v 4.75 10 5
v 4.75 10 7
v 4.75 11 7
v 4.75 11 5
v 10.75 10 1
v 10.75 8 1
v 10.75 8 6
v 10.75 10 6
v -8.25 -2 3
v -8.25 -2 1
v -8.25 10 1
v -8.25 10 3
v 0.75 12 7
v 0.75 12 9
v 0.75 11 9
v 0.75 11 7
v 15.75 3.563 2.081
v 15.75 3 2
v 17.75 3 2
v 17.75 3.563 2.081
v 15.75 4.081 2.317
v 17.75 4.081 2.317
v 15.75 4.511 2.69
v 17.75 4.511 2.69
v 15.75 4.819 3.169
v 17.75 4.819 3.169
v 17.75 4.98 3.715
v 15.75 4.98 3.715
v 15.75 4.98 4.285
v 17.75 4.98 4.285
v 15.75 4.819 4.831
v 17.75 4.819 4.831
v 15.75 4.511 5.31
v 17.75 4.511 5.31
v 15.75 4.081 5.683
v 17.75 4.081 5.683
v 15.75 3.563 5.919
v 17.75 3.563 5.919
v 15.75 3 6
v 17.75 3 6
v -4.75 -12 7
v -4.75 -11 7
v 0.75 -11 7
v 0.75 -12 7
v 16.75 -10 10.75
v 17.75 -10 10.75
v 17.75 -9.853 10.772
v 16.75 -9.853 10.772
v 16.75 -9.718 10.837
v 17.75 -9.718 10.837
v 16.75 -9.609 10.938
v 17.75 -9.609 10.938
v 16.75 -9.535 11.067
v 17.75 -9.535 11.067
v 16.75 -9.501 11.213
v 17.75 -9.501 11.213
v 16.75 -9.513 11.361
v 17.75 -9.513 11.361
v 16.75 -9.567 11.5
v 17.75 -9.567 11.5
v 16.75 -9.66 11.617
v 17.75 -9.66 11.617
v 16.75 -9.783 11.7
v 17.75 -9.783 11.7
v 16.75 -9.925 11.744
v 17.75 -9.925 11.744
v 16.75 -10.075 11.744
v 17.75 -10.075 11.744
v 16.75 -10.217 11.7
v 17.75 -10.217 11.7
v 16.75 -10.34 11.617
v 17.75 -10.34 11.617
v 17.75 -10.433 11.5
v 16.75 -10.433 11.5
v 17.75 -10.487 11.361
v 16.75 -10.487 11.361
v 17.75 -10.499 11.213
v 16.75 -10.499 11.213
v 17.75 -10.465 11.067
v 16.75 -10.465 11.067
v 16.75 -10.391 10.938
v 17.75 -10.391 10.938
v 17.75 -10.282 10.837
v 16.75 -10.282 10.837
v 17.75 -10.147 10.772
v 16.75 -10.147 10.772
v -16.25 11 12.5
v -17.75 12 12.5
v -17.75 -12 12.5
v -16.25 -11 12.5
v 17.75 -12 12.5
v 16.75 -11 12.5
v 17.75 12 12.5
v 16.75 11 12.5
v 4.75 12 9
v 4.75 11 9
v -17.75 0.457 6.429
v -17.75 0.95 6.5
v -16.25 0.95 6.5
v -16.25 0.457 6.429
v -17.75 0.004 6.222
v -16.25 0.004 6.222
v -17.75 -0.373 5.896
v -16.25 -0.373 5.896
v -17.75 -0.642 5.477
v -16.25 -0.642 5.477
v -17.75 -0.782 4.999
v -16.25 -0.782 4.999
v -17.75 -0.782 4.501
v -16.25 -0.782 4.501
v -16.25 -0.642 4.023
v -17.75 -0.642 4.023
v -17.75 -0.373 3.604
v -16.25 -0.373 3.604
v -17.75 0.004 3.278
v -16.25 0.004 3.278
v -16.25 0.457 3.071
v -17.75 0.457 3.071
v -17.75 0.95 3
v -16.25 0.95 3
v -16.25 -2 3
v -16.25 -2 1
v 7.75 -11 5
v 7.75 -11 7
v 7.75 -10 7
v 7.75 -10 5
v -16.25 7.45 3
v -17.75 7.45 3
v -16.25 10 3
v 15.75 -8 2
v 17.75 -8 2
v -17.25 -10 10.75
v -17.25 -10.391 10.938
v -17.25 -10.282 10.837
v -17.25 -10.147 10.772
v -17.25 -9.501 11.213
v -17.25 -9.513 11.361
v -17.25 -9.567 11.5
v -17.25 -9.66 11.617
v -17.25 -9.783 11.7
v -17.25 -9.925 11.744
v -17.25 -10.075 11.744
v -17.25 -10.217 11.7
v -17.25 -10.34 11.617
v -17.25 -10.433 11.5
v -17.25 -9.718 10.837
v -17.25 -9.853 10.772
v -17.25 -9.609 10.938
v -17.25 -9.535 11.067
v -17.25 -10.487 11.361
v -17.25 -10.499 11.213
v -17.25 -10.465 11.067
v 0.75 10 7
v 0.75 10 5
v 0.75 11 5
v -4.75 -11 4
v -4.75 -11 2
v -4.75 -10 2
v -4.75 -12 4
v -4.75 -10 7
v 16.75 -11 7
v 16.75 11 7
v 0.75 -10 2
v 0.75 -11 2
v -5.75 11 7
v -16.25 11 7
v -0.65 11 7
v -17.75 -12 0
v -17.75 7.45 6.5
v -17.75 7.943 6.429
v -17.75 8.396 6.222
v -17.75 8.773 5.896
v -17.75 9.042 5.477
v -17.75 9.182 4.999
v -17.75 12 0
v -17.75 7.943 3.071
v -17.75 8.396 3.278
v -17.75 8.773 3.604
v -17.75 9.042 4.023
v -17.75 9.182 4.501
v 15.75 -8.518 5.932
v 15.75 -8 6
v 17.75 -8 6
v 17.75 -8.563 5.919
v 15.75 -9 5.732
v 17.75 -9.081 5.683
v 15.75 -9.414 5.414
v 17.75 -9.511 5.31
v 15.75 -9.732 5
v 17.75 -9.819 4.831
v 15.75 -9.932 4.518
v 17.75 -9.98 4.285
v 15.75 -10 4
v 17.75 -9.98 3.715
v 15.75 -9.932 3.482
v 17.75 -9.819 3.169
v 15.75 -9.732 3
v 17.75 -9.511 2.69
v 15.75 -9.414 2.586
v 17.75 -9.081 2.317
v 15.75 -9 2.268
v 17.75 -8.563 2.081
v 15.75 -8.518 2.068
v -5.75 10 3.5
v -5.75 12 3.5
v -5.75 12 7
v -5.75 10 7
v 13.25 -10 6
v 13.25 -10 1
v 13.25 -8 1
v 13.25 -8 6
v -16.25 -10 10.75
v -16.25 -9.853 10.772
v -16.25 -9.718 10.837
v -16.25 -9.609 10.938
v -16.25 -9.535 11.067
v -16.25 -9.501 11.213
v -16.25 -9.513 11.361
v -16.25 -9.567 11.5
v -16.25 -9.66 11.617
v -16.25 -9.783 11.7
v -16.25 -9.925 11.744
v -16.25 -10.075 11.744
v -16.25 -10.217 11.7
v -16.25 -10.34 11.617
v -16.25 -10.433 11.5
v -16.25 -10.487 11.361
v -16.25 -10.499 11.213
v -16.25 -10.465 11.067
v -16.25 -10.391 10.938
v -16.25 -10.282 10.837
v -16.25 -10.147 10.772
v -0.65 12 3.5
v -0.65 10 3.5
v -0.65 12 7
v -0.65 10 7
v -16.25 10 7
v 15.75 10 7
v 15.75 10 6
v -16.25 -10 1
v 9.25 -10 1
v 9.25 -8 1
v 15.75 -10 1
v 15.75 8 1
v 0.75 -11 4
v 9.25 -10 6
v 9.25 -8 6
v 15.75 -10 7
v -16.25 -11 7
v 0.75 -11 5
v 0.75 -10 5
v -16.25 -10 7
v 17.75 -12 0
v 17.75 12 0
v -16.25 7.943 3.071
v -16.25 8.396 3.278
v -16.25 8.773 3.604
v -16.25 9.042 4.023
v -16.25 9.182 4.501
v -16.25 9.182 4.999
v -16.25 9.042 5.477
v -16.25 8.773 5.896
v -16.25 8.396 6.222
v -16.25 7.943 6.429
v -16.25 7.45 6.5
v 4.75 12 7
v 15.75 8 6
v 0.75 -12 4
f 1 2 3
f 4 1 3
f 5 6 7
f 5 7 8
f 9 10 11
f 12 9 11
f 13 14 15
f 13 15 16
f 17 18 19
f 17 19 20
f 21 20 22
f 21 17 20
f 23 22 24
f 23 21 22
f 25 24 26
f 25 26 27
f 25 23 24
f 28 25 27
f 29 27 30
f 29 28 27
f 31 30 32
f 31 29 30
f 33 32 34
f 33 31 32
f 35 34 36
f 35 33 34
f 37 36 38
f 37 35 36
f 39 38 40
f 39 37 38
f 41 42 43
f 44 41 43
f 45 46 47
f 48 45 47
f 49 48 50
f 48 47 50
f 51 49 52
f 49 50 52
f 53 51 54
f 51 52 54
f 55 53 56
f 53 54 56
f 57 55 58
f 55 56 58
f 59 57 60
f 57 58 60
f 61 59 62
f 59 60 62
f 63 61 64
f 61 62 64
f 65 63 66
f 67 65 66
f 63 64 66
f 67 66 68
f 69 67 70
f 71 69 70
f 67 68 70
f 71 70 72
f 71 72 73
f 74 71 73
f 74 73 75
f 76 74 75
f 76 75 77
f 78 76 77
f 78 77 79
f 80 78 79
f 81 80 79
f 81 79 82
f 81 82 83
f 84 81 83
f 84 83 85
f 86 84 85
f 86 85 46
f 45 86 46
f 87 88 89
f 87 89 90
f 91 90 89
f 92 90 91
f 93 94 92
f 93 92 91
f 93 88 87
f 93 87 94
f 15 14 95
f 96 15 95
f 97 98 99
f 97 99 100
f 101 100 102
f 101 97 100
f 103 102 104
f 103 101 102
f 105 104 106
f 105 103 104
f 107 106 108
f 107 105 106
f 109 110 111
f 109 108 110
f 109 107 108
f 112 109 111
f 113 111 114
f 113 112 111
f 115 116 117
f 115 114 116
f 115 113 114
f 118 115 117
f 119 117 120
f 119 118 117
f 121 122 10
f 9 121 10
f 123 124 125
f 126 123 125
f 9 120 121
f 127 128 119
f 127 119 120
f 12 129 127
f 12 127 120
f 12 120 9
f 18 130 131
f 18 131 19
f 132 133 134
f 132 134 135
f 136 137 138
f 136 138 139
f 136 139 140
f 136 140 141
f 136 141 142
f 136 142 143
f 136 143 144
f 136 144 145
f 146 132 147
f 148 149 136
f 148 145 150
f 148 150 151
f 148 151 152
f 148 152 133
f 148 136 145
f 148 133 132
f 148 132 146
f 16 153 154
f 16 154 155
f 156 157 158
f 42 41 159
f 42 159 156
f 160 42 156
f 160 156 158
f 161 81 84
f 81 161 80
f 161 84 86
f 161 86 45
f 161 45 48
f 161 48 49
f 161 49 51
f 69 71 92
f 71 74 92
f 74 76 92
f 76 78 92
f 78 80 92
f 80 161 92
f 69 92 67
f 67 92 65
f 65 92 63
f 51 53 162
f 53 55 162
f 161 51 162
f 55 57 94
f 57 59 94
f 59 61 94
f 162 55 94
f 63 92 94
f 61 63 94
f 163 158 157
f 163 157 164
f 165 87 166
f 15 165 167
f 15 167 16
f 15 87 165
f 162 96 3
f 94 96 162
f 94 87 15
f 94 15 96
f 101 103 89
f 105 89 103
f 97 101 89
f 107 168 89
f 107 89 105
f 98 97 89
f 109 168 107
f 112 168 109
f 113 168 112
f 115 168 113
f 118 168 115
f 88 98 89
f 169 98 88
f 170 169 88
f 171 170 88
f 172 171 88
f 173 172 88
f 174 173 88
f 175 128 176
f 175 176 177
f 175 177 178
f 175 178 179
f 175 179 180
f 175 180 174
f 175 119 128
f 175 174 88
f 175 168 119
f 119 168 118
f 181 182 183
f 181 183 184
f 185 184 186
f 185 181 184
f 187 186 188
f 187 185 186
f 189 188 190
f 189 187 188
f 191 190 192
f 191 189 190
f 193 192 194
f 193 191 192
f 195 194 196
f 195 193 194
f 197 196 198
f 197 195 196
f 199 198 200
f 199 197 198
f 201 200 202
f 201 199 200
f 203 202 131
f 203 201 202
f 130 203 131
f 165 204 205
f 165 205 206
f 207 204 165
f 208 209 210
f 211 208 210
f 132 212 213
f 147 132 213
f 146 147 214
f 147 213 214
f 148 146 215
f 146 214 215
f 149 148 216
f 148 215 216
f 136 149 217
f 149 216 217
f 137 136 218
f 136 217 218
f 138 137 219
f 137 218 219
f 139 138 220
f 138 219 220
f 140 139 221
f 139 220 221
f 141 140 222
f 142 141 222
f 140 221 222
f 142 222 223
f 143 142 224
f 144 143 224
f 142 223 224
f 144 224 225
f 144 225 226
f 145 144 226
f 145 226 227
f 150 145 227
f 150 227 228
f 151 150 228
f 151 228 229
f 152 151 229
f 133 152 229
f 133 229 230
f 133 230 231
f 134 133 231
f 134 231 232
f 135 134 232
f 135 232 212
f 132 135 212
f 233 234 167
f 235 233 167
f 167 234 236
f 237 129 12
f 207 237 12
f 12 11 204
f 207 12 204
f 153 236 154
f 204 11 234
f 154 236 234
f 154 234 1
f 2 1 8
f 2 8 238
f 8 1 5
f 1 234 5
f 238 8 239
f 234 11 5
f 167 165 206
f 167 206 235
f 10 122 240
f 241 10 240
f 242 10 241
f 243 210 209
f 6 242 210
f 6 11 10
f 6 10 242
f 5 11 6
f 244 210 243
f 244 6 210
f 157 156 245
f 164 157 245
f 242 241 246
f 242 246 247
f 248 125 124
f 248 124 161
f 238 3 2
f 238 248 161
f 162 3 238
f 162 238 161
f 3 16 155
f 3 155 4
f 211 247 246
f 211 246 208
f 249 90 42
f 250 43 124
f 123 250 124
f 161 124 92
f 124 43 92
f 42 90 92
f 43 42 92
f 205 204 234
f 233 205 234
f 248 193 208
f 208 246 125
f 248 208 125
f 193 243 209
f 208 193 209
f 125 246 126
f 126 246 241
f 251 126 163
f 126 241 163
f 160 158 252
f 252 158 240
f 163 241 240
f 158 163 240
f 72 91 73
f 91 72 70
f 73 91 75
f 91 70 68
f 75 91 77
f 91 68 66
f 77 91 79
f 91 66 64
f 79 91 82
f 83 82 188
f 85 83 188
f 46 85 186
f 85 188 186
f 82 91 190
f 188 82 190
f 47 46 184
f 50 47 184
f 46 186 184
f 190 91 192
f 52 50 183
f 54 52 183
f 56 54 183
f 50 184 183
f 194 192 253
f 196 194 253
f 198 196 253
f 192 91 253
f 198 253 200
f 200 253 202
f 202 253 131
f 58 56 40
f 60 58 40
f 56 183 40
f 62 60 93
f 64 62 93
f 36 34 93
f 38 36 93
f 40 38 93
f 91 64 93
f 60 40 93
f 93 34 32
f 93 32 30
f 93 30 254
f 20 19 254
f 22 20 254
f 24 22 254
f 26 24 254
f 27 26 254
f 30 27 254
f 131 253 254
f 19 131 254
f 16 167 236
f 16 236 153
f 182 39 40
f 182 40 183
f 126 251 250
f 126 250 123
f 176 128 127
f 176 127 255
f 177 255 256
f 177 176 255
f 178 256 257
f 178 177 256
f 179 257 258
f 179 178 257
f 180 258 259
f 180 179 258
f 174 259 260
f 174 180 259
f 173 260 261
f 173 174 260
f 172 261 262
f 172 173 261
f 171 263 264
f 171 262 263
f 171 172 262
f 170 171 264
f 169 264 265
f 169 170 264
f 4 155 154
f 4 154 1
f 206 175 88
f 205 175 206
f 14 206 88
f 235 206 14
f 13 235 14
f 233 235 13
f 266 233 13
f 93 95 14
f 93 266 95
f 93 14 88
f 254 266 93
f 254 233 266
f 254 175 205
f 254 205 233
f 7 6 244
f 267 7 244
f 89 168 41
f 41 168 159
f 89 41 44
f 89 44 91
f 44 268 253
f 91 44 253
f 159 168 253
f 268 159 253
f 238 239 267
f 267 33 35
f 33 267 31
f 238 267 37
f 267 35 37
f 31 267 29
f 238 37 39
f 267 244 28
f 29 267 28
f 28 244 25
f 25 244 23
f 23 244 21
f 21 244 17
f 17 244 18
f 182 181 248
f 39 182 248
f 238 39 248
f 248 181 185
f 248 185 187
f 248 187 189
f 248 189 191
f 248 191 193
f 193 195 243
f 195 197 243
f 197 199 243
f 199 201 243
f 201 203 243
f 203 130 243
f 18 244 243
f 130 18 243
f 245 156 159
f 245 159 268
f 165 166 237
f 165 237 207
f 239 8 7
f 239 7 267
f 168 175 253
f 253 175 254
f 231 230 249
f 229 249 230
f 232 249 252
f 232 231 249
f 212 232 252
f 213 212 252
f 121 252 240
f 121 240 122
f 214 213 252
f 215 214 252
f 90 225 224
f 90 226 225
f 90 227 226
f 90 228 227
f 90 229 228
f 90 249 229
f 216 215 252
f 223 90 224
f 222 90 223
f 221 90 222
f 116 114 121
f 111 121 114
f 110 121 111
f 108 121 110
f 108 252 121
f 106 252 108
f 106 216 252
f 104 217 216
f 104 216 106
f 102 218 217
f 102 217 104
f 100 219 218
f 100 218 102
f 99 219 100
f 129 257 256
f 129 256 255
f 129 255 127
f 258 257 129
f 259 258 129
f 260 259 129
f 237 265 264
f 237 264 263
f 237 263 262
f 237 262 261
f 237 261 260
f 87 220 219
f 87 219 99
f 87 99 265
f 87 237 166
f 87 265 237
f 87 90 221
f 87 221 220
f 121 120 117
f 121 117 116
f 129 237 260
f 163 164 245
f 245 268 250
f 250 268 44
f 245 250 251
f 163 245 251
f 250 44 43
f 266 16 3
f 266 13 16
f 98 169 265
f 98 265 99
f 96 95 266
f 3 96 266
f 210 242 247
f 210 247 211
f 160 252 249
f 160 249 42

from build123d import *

# Parameters (mm, degrees)
SKETCH_1_W           = 35.5
SKETCH_1_H           = 24
EXTRUDE_1_DEPTH      = 12.5
SKETCH_2_W           = 33
SKETCH_2_H           = 22
CUT_EXTRUDE_1_DEPTH  = 11.5
CUT_EXTRUDE_2_DEPTH  = 2
EXTRUDE_2_DEPTH      = 6
SKETCH_7_W           = 4
SKETCH_7_H           = 2
SKETCH_7_W_2         = 5
EXTRUDE_3_DEPTH      = 5
CUT_EXTRUDE_4_DEPTH  = 2
SKETCH_11_R          = 0.5
CUT_EXTRUDE_5_DEPTH  = 35
SKETCH_12_W          = 5.5
SKETCH_12_H          = 1
CUT_EXTRUDE_6_DEPTH  = 5
SKETCH_15_W          = 5.5
SKETCH_15_H          = 3
CUT_EXTRUDE_7_DEPTH  = 5
SKETCH_16_W          = 5.1
SKETCH_16_H          = 3.5
CUT_EXTRUDE_8_DEPTH  = 5
SKETCH_18_W          = 7
SKETCH_18_H          = 1
FPC_DEPTH            = 2
SKETCH_19_W          = 8
SKETCH_19_H          = 12
USB_DEPTH            = 2
SKETCH_20_W          = 4
SKETCH_20_H          = 2
CUT_EXTRUDE_10_DEPTH = 2
SKETCH_21_W          = 4
SKETCH_21_H          = 1
CUT_EXTRUDE_11_DEPTH = 2


with BuildPart() as part:
    # 草图1 → 凸台-拉伸1 (new body)
    with BuildSketch(Plane.XY):
        Rectangle(SKETCH_1_W, SKETCH_1_H)
    extrude(amount=EXTRUDE_1_DEPTH)

    # 草图2 → 切除-拉伸1 (cut)
    with BuildSketch(Plane.XY.offset(12.5)):
        with Locations((0.25, 0)):
            Rectangle(SKETCH_2_W, SKETCH_2_H)
    extrude(amount=-CUT_EXTRUDE_1_DEPTH, mode=Mode.SUBTRACT)

    # 草图3 → 切除-拉伸2 (cut)
    with BuildSketch(Plane.ZY.offset(17.75)):
        with BuildLine():
            Line((6.5, 7.45), (6.5, 0.95))
            ThreePointArc((6.5, 0.95), (4.75, -0.8), (3, 0.95))
            Line((3, 0.95), (3, 7.45))
            ThreePointArc((3, 7.45), (4.75, 9.2), (6.5, 7.45))
        make_face()
    extrude(amount=-CUT_EXTRUDE_2_DEPTH, mode=Mode.SUBTRACT)

    # 草图6 → 凸台-拉伸2 (add)
    with BuildSketch(Plane.XY.offset(1)):
        Polygon((-16.25, 10), (15.75, 10), (15.75, -10), (-16.25, -10), (-16.25, -11), (16.75, -11), (16.75, 11), (-16.25, 11), align=None)
    extrude(amount=EXTRUDE_2_DEPTH)

    # 草图7 → 凸台-拉伸3 (add)
    with BuildSketch(Plane.XY.offset(1)):
        with Locations((11.25, -9)):
            Rectangle(SKETCH_7_W, SKETCH_7_H)
        with Locations((13.25, 9)):
            Rectangle(SKETCH_7_W_2, SKETCH_7_H)
    extrude(amount=EXTRUDE_3_DEPTH)

    # 草图10 → 切除-拉伸4 (cut)
    with BuildSketch(Plane.ZY.offset(-15.75)):
        with BuildLine():
            Line((2, -8), (2, 3))
            ThreePointArc((2, 3), (4, 5), (6, 3))
            Line((6, 3), (6, -8))
            ThreePointArc((6, -8), (4, -10), (2, -8))
        make_face()
    extrude(amount=-CUT_EXTRUDE_4_DEPTH, mode=Mode.SUBTRACT)

    # 草图11 → 切除-拉伸5 (cut)
    with BuildSketch(Plane(origin=(17.75, 0, 0), x_dir=(0, 0, -1), z_dir=(1, 0, 0))):
        with Locations((-11.25, -10)):
            Circle(SKETCH_11_R)
    extrude(amount=-CUT_EXTRUDE_5_DEPTH, mode=Mode.SUBTRACT)

    # 草图12 → 切除-拉伸6 (cut)
    with BuildSketch(Plane.XY.offset(7)):
        with Locations((-2, -10.5)):
            Rectangle(SKETCH_12_W, SKETCH_12_H)
    extrude(amount=-CUT_EXTRUDE_6_DEPTH, mode=Mode.SUBTRACT)

    # 草图15 → 切除-拉伸7 (cut)
    with BuildSketch(Plane(origin=(0, -11, 0), x_dir=(1, 0, 0), z_dir=(0, 1, 0))):
        with Locations((-2, -5.5)):
            Rectangle(SKETCH_15_W, SKETCH_15_H)
    extrude(amount=-CUT_EXTRUDE_7_DEPTH, mode=Mode.SUBTRACT)

    # 草图16 → 切除-拉伸8 (cut)
    with BuildSketch(Plane.XZ.offset(-10)):
        with Locations((-3.2, 5.25)):
            Rectangle(SKETCH_16_W, SKETCH_16_H)
    extrude(amount=-CUT_EXTRUDE_8_DEPTH, mode=Mode.SUBTRACT)

    # 草图18 → FPC排线间隙 (cut)
    with BuildSketch(Plane.XY.offset(7)):
        with Locations((4.25, -10.5)):
            Rectangle(SKETCH_18_W, SKETCH_18_H)
    extrude(amount=-FPC_DEPTH, mode=Mode.SUBTRACT)

    # 草图19 → USB支撑 (add)
    with BuildSketch(Plane.XY.offset(1)):
        with Locations((-12.25, 4)):
            Rectangle(SKETCH_19_W, SKETCH_19_H)
    extrude(amount=USB_DEPTH)

    # 草图20 → 切除-拉伸10 (cut)
    with BuildSketch(Plane(origin=(0, 12, 0), x_dir=(1, 0, 0), z_dir=(0, 1, 0))):
        with Locations((2.75, -8)):
            Rectangle(SKETCH_20_W, SKETCH_20_H)
    extrude(amount=-CUT_EXTRUDE_10_DEPTH, mode=Mode.SUBTRACT)

    # 草图21 → 切除-拉伸11 (cut)
    with BuildSketch(Plane.XY.offset(7)):
        with Locations((2.75, 10.5)):
            Rectangle(SKETCH_21_W, SKETCH_21_H)
    extrude(amount=-CUT_EXTRUDE_11_DEPTH, mode=Mode.SUBTRACT)


solid = part.part
